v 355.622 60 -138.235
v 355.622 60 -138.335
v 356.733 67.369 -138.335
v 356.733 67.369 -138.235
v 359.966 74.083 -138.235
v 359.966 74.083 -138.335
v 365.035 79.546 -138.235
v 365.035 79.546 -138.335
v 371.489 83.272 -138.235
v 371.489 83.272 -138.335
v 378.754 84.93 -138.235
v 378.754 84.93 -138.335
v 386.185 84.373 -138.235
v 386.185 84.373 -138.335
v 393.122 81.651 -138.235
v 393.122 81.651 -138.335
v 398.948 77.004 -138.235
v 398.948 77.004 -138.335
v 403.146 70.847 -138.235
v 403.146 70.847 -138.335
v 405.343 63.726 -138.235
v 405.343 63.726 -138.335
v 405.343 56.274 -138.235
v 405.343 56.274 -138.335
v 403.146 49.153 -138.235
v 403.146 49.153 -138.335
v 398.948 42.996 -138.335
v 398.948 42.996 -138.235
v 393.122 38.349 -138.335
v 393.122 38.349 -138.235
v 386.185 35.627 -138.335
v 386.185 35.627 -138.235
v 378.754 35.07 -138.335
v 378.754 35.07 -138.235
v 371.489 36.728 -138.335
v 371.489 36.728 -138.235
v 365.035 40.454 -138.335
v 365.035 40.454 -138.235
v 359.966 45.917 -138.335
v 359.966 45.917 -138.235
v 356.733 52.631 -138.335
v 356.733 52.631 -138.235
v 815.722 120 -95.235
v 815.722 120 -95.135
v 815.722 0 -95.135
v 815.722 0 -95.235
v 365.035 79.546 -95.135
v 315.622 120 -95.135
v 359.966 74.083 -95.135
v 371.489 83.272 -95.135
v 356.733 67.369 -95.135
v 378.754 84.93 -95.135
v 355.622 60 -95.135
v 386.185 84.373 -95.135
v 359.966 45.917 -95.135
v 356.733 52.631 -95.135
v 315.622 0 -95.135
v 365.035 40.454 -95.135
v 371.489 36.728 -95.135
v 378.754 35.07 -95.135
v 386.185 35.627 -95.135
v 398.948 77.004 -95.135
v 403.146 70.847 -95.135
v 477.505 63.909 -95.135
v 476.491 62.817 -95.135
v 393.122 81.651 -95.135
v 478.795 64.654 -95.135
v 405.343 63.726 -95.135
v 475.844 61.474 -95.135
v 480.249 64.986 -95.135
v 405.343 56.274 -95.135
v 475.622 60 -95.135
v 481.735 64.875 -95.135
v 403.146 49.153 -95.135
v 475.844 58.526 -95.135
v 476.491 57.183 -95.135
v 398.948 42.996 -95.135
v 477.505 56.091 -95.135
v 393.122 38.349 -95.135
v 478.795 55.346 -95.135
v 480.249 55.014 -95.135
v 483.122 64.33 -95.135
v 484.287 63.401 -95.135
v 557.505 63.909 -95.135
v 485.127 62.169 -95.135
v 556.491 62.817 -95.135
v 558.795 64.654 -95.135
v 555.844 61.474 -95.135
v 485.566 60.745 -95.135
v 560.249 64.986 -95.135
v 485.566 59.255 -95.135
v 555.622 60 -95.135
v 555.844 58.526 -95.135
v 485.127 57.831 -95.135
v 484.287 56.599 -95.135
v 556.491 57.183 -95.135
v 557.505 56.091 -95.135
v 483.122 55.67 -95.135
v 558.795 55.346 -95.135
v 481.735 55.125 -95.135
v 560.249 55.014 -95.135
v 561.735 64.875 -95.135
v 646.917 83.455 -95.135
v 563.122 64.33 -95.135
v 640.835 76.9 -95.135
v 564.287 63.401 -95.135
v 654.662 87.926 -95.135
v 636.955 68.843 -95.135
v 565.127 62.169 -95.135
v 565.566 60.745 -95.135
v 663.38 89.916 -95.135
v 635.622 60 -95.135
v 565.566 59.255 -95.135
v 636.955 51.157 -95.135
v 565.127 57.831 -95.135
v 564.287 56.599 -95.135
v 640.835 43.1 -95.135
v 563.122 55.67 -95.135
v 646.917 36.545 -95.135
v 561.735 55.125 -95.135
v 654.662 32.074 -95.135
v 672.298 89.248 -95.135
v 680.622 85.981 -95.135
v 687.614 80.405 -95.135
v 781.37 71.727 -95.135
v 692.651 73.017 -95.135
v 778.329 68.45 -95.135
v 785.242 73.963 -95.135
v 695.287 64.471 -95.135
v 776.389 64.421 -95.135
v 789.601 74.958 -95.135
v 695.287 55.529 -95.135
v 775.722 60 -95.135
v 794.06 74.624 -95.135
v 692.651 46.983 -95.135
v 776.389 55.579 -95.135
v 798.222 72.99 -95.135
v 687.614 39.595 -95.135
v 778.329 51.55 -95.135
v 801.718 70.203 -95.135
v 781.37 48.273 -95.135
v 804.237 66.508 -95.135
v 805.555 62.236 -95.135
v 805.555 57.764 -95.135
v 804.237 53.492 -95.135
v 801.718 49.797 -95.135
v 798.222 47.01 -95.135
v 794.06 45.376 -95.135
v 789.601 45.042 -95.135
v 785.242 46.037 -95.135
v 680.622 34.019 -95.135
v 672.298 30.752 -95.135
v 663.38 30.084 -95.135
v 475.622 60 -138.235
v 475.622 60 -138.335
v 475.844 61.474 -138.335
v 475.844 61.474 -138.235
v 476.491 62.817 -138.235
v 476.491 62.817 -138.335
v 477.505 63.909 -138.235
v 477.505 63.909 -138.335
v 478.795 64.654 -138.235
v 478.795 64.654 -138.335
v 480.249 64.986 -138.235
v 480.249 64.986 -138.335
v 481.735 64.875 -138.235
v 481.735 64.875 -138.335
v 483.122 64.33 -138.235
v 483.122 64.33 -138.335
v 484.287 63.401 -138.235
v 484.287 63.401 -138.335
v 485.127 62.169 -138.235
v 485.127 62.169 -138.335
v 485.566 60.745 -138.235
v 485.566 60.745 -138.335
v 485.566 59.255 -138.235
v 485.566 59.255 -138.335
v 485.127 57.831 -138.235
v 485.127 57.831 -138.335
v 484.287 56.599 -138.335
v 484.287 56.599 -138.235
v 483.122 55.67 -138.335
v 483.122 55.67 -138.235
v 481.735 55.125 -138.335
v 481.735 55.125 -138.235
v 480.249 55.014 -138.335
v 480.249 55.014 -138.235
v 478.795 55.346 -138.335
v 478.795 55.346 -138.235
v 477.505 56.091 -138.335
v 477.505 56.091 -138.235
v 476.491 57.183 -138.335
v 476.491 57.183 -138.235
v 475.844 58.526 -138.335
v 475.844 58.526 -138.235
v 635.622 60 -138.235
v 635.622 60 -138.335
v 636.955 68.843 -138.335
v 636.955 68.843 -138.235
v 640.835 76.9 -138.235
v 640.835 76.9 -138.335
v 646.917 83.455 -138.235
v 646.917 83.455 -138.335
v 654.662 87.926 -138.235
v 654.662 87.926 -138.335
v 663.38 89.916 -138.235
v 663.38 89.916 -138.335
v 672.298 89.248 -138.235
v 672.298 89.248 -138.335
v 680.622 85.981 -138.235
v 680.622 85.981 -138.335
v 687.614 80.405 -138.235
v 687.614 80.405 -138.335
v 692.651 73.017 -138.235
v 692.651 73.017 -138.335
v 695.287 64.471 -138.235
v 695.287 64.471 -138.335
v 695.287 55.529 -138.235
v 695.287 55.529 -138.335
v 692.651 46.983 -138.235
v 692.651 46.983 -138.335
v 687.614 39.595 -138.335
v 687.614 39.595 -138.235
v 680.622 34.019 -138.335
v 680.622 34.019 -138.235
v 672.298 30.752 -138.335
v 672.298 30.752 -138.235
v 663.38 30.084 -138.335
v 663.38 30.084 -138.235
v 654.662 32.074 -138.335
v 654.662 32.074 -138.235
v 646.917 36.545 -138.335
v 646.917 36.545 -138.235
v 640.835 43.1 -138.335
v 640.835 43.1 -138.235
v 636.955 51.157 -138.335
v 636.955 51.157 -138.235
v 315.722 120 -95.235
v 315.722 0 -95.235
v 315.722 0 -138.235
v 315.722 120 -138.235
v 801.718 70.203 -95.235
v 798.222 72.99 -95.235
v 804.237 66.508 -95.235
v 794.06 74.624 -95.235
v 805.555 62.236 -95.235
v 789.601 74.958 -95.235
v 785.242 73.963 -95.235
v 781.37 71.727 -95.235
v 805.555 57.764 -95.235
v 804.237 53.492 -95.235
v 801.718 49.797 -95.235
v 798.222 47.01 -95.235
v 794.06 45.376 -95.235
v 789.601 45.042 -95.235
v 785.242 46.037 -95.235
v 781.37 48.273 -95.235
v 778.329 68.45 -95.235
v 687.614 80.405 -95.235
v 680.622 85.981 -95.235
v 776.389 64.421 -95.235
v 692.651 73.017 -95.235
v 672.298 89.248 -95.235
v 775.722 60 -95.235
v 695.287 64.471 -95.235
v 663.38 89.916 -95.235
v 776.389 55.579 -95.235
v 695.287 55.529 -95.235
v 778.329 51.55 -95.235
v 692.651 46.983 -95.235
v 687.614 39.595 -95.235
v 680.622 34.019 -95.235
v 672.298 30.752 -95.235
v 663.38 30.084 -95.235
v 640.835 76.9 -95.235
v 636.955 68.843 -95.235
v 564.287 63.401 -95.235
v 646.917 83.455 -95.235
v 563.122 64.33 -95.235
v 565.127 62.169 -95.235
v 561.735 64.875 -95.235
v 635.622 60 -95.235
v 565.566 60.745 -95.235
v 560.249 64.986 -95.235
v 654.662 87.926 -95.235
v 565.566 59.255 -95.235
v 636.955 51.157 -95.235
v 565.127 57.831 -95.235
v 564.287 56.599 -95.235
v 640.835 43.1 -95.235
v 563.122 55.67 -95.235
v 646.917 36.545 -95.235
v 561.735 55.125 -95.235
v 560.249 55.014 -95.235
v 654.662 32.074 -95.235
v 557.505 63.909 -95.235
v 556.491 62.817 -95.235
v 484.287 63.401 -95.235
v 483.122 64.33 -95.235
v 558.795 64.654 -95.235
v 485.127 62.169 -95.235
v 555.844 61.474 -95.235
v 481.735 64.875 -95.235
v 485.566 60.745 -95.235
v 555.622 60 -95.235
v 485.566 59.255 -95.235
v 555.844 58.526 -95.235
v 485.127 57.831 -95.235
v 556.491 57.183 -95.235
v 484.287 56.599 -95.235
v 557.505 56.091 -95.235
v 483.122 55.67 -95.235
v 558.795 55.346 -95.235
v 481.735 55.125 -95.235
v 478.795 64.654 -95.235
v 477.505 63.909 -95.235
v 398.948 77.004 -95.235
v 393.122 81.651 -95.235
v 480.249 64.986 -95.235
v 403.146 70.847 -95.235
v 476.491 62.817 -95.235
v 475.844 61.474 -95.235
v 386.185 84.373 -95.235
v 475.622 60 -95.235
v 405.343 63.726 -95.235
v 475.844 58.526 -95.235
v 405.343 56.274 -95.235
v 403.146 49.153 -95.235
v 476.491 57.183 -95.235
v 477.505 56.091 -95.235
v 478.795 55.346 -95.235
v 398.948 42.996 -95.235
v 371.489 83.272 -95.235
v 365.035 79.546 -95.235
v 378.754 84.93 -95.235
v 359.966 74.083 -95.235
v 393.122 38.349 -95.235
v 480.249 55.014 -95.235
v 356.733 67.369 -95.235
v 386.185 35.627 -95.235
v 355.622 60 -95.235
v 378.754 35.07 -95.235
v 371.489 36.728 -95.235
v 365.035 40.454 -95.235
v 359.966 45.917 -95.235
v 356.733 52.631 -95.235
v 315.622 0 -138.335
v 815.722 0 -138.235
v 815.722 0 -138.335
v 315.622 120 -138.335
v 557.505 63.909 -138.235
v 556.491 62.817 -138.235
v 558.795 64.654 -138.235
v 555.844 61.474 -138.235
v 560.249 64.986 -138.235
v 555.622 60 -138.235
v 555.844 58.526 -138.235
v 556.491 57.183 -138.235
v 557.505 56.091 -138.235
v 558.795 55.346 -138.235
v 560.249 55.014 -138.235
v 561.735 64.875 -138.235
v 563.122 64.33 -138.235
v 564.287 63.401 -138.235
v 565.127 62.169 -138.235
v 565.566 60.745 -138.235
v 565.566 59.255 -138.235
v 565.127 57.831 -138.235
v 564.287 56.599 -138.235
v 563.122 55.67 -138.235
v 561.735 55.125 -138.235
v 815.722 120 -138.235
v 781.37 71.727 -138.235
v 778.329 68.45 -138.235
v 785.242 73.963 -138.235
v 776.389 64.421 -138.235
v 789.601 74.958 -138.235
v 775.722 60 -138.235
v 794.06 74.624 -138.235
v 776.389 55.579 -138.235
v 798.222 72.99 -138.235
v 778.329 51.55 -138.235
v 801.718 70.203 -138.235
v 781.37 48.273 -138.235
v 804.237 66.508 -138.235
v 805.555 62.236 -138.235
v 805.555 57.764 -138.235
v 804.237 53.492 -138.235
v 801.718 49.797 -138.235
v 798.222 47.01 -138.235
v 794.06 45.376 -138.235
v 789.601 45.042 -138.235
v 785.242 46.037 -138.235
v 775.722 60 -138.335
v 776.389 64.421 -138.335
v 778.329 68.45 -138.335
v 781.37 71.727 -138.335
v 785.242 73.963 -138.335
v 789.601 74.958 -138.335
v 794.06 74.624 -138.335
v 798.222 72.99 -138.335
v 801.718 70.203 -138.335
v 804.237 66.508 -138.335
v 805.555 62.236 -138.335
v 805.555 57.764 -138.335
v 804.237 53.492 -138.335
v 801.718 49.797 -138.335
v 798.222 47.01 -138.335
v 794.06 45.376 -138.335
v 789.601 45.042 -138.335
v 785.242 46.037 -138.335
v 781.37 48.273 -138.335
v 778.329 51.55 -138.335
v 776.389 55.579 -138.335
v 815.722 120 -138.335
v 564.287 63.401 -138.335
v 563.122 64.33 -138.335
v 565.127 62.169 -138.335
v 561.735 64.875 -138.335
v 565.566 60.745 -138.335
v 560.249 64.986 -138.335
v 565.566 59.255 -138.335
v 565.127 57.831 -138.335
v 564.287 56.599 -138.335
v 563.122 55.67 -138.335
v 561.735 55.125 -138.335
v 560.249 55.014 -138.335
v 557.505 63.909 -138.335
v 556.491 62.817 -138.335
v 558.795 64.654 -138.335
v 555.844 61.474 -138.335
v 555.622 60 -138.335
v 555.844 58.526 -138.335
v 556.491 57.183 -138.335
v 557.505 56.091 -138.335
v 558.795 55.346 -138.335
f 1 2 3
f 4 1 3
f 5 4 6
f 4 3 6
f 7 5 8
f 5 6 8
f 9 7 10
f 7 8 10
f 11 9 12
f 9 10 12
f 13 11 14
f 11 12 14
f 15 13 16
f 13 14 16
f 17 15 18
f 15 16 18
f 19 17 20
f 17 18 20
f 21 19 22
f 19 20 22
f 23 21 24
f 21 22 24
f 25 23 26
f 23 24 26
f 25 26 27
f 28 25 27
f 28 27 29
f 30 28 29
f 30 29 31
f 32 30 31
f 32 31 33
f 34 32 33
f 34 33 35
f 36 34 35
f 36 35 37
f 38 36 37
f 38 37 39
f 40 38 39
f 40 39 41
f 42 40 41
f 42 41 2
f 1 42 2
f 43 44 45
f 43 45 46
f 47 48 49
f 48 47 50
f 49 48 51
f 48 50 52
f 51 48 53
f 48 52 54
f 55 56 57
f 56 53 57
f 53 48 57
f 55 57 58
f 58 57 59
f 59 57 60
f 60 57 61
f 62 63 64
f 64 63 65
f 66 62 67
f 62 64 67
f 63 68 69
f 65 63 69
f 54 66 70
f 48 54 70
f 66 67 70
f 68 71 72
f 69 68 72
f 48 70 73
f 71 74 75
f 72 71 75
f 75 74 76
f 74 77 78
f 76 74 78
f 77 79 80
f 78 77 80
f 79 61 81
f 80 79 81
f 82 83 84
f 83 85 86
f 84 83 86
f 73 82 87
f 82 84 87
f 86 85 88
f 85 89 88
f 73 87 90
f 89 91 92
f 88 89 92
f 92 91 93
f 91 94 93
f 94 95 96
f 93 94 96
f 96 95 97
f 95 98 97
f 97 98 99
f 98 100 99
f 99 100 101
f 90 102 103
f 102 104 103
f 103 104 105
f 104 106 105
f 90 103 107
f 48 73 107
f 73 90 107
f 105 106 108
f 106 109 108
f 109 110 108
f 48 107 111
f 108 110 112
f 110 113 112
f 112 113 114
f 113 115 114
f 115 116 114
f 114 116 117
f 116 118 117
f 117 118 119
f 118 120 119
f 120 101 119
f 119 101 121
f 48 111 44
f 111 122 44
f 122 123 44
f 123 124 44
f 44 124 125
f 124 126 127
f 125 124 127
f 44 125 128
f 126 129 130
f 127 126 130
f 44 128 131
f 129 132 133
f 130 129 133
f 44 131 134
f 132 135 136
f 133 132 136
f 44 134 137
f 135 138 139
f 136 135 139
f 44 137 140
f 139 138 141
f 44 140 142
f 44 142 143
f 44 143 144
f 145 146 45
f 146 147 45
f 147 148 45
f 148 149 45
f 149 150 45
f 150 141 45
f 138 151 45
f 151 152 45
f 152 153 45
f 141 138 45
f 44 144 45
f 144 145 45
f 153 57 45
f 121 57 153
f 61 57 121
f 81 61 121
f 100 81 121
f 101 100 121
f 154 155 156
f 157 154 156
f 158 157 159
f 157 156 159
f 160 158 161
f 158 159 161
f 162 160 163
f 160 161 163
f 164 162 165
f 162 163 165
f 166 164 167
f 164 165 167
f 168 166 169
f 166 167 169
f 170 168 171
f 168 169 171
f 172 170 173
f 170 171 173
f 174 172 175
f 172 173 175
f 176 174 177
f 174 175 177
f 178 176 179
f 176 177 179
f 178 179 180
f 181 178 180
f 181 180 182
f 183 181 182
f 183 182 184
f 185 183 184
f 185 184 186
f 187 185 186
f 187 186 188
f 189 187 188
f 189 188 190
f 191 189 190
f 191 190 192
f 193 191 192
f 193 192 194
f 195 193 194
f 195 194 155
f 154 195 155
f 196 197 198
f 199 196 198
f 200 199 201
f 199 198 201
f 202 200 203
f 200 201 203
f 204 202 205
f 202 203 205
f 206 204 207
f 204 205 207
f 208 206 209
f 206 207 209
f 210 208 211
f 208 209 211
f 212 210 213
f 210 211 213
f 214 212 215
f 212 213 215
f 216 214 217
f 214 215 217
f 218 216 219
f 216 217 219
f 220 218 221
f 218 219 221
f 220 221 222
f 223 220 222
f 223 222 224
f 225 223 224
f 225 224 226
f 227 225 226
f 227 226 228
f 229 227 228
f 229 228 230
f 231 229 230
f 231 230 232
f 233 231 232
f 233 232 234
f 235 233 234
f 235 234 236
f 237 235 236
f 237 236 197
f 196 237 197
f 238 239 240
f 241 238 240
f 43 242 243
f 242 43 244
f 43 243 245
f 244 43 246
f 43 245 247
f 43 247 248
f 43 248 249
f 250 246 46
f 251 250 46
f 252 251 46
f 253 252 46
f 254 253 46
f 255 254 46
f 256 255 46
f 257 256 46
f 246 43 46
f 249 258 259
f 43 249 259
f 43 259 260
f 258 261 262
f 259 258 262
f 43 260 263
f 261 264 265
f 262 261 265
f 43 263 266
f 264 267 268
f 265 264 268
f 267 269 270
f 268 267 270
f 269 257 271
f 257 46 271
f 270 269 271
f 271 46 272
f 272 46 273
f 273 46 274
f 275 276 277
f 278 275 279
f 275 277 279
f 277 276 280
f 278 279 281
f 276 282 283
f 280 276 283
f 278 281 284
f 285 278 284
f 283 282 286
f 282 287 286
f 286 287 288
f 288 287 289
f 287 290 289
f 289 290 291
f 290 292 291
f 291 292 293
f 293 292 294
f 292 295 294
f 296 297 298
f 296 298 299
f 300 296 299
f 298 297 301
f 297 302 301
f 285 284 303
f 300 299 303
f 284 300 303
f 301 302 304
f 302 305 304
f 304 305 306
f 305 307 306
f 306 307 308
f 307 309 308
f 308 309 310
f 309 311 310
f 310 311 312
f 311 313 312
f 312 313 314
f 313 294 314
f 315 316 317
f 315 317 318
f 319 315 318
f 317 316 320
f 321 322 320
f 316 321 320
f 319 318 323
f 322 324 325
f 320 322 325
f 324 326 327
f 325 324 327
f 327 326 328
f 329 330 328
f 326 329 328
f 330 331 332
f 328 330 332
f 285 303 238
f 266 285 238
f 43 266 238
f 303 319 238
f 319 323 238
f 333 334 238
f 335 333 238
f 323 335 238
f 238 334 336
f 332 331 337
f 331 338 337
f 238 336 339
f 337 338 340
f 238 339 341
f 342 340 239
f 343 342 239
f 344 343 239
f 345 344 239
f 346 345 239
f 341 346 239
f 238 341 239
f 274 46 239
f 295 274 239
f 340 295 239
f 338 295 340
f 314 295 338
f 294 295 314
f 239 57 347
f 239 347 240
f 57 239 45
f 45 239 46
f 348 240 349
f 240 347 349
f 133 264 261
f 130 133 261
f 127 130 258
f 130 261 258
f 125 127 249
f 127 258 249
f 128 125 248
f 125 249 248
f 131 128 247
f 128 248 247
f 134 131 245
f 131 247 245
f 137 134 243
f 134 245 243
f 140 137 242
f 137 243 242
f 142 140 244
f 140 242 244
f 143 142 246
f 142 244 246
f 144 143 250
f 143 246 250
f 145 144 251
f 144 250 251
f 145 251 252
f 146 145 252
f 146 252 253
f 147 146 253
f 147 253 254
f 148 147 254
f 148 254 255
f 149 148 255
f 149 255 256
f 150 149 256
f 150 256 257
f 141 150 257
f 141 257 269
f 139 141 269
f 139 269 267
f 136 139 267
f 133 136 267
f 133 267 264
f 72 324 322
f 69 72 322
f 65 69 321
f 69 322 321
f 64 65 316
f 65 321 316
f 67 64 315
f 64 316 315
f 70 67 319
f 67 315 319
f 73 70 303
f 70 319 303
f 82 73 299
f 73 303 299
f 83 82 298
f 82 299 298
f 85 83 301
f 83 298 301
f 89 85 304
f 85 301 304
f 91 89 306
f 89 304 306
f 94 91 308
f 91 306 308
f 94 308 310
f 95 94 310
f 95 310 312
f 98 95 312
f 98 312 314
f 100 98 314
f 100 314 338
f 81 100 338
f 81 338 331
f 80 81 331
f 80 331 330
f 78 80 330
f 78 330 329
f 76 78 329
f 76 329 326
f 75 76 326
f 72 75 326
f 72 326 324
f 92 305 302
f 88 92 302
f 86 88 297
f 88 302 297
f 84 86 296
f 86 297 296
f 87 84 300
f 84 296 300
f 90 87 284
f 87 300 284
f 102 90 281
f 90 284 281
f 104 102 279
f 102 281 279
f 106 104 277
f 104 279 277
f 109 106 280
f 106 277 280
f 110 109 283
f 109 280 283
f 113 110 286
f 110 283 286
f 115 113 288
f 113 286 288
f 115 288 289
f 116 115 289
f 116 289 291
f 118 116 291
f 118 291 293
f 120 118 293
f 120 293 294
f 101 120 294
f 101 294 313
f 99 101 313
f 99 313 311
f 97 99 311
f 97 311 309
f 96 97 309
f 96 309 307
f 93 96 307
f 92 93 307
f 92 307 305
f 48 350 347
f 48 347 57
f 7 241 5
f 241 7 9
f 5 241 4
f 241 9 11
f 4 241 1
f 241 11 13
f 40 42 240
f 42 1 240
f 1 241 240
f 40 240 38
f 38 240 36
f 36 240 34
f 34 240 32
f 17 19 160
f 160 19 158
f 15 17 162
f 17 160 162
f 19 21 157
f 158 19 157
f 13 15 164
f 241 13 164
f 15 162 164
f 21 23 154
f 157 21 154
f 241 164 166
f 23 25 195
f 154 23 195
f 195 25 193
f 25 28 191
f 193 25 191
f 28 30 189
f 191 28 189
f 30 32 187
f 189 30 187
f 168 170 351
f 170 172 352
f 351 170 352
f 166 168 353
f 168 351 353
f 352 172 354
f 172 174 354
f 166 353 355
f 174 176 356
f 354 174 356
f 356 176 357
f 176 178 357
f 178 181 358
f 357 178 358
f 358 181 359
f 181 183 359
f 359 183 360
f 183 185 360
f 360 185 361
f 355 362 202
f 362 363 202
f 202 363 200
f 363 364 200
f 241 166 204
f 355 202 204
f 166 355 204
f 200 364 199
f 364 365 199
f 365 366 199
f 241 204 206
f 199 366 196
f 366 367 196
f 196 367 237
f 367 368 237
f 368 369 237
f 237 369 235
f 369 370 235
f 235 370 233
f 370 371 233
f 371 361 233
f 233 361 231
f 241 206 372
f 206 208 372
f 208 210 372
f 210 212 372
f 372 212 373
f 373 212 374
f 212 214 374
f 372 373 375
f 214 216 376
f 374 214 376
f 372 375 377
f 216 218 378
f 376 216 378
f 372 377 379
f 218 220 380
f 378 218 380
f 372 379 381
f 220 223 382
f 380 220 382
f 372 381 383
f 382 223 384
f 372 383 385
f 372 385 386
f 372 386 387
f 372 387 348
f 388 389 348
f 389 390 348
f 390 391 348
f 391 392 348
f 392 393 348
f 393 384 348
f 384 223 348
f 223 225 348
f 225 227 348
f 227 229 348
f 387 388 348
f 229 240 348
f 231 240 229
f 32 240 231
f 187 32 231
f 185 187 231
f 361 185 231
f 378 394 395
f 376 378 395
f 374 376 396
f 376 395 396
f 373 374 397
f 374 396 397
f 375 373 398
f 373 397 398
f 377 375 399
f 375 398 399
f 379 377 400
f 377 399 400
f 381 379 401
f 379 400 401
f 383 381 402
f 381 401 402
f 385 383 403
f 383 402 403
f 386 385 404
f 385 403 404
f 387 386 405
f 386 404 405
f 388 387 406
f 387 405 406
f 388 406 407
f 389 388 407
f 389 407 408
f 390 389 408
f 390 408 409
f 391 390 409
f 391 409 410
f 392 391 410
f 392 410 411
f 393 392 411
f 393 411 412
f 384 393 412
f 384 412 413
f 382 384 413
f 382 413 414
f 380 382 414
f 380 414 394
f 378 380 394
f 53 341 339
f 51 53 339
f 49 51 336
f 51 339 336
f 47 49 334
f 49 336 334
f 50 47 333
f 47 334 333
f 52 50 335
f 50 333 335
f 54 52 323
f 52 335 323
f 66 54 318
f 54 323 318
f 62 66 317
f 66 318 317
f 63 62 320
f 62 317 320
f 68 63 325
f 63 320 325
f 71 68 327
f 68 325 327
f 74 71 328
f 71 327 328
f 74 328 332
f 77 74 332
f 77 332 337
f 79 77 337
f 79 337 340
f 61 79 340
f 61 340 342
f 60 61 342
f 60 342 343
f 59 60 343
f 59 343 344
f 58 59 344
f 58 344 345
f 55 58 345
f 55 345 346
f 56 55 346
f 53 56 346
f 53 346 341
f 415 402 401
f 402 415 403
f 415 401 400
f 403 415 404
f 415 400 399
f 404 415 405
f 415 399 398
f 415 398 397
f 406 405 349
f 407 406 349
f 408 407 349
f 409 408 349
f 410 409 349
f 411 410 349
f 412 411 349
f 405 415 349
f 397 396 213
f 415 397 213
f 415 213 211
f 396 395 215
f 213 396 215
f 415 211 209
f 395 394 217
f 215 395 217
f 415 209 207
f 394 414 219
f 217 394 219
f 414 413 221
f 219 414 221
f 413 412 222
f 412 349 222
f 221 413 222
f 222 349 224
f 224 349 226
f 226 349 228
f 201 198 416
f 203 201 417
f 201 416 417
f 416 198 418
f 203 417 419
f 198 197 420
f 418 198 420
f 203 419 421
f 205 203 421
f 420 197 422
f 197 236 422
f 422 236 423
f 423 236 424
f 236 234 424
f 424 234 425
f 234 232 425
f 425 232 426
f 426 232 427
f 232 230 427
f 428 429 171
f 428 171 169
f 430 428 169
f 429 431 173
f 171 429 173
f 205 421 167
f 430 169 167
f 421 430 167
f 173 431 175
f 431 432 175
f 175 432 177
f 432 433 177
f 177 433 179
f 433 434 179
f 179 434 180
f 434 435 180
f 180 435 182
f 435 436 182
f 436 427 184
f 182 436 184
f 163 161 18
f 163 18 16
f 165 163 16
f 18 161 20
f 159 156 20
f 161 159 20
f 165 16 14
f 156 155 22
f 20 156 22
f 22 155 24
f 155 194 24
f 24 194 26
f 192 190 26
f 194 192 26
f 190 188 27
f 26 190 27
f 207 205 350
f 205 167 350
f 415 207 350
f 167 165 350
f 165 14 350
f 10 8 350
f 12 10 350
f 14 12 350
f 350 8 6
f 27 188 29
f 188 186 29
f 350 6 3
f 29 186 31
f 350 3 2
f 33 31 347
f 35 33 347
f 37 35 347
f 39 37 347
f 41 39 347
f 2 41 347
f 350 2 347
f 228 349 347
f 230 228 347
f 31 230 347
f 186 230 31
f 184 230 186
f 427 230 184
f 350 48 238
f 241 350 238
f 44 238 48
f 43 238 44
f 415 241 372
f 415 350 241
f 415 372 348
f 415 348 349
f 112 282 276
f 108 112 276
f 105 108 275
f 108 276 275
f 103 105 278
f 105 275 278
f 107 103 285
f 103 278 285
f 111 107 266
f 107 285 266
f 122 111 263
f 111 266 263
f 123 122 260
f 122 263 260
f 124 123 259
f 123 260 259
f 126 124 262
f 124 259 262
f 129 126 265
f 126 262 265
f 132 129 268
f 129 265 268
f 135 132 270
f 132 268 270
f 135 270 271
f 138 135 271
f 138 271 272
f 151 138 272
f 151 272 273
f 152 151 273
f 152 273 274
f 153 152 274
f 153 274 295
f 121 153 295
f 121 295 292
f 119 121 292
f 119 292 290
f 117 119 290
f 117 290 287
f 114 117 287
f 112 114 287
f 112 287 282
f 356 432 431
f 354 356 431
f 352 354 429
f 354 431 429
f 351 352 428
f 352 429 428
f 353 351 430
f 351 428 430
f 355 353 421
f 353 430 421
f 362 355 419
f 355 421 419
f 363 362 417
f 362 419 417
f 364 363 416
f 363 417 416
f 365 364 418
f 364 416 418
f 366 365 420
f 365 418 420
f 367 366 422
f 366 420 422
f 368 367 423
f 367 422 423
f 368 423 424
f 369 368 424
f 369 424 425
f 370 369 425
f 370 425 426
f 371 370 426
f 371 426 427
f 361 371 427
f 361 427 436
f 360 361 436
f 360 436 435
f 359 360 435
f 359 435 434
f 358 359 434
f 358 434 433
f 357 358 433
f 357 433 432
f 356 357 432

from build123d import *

# Parameters (mm, degrees)
EXTRUDE_1_DEPTH     = 120
SKETCH_2_R          = 25
SKETCH_2_R_2        = 5
SKETCH_2_R_3        = 30
SKETCH_2_R_4        = 15
CUT_EXTRUDE_1_DEPTH = 120


with BuildPart() as part:
    # 草图1 → 凸台-拉伸1 (new body)
    with BuildSketch(Plane(origin=(0, 0, 0), x_dir=(1, 0, 0), z_dir=(0, 1, 0))):
        Polygon((815.722184809, 138.335459402), (315.622184809, 138.335459402), (315.622184809, 95.135459402), (815.722184809, 95.135459402), (815.722184809, 95.235459402), (315.722184809, 95.235459402), (315.722184809, 138.235459402), (815.722184809, 138.235459402), align=None)
    extrude(amount=EXTRUDE_1_DEPTH)

    # 草图2 → 切除-拉伸1 (cut)
    with BuildSketch(Plane(origin=(0, 0, -138.335459402), x_dir=(-1, 0, 0), z_dir=(0, 0, -1))):
        with Locations((-380.622184809, 60)):
            Circle(SKETCH_2_R)
        with Locations((-480.622184809, 60)):
            Circle(SKETCH_2_R_2)
        with Locations((-560.622184809, 60)):
            Circle(SKETCH_2_R_2)
        with Locations((-665.622184809, 60)):
            Circle(SKETCH_2_R_3)
        with Locations((-790.722184809, 60)):
            Circle(SKETCH_2_R_4)
    extrude(amount=-CUT_EXTRUDE_1_DEPTH, mode=Mode.SUBTRACT)


solid = part.part
